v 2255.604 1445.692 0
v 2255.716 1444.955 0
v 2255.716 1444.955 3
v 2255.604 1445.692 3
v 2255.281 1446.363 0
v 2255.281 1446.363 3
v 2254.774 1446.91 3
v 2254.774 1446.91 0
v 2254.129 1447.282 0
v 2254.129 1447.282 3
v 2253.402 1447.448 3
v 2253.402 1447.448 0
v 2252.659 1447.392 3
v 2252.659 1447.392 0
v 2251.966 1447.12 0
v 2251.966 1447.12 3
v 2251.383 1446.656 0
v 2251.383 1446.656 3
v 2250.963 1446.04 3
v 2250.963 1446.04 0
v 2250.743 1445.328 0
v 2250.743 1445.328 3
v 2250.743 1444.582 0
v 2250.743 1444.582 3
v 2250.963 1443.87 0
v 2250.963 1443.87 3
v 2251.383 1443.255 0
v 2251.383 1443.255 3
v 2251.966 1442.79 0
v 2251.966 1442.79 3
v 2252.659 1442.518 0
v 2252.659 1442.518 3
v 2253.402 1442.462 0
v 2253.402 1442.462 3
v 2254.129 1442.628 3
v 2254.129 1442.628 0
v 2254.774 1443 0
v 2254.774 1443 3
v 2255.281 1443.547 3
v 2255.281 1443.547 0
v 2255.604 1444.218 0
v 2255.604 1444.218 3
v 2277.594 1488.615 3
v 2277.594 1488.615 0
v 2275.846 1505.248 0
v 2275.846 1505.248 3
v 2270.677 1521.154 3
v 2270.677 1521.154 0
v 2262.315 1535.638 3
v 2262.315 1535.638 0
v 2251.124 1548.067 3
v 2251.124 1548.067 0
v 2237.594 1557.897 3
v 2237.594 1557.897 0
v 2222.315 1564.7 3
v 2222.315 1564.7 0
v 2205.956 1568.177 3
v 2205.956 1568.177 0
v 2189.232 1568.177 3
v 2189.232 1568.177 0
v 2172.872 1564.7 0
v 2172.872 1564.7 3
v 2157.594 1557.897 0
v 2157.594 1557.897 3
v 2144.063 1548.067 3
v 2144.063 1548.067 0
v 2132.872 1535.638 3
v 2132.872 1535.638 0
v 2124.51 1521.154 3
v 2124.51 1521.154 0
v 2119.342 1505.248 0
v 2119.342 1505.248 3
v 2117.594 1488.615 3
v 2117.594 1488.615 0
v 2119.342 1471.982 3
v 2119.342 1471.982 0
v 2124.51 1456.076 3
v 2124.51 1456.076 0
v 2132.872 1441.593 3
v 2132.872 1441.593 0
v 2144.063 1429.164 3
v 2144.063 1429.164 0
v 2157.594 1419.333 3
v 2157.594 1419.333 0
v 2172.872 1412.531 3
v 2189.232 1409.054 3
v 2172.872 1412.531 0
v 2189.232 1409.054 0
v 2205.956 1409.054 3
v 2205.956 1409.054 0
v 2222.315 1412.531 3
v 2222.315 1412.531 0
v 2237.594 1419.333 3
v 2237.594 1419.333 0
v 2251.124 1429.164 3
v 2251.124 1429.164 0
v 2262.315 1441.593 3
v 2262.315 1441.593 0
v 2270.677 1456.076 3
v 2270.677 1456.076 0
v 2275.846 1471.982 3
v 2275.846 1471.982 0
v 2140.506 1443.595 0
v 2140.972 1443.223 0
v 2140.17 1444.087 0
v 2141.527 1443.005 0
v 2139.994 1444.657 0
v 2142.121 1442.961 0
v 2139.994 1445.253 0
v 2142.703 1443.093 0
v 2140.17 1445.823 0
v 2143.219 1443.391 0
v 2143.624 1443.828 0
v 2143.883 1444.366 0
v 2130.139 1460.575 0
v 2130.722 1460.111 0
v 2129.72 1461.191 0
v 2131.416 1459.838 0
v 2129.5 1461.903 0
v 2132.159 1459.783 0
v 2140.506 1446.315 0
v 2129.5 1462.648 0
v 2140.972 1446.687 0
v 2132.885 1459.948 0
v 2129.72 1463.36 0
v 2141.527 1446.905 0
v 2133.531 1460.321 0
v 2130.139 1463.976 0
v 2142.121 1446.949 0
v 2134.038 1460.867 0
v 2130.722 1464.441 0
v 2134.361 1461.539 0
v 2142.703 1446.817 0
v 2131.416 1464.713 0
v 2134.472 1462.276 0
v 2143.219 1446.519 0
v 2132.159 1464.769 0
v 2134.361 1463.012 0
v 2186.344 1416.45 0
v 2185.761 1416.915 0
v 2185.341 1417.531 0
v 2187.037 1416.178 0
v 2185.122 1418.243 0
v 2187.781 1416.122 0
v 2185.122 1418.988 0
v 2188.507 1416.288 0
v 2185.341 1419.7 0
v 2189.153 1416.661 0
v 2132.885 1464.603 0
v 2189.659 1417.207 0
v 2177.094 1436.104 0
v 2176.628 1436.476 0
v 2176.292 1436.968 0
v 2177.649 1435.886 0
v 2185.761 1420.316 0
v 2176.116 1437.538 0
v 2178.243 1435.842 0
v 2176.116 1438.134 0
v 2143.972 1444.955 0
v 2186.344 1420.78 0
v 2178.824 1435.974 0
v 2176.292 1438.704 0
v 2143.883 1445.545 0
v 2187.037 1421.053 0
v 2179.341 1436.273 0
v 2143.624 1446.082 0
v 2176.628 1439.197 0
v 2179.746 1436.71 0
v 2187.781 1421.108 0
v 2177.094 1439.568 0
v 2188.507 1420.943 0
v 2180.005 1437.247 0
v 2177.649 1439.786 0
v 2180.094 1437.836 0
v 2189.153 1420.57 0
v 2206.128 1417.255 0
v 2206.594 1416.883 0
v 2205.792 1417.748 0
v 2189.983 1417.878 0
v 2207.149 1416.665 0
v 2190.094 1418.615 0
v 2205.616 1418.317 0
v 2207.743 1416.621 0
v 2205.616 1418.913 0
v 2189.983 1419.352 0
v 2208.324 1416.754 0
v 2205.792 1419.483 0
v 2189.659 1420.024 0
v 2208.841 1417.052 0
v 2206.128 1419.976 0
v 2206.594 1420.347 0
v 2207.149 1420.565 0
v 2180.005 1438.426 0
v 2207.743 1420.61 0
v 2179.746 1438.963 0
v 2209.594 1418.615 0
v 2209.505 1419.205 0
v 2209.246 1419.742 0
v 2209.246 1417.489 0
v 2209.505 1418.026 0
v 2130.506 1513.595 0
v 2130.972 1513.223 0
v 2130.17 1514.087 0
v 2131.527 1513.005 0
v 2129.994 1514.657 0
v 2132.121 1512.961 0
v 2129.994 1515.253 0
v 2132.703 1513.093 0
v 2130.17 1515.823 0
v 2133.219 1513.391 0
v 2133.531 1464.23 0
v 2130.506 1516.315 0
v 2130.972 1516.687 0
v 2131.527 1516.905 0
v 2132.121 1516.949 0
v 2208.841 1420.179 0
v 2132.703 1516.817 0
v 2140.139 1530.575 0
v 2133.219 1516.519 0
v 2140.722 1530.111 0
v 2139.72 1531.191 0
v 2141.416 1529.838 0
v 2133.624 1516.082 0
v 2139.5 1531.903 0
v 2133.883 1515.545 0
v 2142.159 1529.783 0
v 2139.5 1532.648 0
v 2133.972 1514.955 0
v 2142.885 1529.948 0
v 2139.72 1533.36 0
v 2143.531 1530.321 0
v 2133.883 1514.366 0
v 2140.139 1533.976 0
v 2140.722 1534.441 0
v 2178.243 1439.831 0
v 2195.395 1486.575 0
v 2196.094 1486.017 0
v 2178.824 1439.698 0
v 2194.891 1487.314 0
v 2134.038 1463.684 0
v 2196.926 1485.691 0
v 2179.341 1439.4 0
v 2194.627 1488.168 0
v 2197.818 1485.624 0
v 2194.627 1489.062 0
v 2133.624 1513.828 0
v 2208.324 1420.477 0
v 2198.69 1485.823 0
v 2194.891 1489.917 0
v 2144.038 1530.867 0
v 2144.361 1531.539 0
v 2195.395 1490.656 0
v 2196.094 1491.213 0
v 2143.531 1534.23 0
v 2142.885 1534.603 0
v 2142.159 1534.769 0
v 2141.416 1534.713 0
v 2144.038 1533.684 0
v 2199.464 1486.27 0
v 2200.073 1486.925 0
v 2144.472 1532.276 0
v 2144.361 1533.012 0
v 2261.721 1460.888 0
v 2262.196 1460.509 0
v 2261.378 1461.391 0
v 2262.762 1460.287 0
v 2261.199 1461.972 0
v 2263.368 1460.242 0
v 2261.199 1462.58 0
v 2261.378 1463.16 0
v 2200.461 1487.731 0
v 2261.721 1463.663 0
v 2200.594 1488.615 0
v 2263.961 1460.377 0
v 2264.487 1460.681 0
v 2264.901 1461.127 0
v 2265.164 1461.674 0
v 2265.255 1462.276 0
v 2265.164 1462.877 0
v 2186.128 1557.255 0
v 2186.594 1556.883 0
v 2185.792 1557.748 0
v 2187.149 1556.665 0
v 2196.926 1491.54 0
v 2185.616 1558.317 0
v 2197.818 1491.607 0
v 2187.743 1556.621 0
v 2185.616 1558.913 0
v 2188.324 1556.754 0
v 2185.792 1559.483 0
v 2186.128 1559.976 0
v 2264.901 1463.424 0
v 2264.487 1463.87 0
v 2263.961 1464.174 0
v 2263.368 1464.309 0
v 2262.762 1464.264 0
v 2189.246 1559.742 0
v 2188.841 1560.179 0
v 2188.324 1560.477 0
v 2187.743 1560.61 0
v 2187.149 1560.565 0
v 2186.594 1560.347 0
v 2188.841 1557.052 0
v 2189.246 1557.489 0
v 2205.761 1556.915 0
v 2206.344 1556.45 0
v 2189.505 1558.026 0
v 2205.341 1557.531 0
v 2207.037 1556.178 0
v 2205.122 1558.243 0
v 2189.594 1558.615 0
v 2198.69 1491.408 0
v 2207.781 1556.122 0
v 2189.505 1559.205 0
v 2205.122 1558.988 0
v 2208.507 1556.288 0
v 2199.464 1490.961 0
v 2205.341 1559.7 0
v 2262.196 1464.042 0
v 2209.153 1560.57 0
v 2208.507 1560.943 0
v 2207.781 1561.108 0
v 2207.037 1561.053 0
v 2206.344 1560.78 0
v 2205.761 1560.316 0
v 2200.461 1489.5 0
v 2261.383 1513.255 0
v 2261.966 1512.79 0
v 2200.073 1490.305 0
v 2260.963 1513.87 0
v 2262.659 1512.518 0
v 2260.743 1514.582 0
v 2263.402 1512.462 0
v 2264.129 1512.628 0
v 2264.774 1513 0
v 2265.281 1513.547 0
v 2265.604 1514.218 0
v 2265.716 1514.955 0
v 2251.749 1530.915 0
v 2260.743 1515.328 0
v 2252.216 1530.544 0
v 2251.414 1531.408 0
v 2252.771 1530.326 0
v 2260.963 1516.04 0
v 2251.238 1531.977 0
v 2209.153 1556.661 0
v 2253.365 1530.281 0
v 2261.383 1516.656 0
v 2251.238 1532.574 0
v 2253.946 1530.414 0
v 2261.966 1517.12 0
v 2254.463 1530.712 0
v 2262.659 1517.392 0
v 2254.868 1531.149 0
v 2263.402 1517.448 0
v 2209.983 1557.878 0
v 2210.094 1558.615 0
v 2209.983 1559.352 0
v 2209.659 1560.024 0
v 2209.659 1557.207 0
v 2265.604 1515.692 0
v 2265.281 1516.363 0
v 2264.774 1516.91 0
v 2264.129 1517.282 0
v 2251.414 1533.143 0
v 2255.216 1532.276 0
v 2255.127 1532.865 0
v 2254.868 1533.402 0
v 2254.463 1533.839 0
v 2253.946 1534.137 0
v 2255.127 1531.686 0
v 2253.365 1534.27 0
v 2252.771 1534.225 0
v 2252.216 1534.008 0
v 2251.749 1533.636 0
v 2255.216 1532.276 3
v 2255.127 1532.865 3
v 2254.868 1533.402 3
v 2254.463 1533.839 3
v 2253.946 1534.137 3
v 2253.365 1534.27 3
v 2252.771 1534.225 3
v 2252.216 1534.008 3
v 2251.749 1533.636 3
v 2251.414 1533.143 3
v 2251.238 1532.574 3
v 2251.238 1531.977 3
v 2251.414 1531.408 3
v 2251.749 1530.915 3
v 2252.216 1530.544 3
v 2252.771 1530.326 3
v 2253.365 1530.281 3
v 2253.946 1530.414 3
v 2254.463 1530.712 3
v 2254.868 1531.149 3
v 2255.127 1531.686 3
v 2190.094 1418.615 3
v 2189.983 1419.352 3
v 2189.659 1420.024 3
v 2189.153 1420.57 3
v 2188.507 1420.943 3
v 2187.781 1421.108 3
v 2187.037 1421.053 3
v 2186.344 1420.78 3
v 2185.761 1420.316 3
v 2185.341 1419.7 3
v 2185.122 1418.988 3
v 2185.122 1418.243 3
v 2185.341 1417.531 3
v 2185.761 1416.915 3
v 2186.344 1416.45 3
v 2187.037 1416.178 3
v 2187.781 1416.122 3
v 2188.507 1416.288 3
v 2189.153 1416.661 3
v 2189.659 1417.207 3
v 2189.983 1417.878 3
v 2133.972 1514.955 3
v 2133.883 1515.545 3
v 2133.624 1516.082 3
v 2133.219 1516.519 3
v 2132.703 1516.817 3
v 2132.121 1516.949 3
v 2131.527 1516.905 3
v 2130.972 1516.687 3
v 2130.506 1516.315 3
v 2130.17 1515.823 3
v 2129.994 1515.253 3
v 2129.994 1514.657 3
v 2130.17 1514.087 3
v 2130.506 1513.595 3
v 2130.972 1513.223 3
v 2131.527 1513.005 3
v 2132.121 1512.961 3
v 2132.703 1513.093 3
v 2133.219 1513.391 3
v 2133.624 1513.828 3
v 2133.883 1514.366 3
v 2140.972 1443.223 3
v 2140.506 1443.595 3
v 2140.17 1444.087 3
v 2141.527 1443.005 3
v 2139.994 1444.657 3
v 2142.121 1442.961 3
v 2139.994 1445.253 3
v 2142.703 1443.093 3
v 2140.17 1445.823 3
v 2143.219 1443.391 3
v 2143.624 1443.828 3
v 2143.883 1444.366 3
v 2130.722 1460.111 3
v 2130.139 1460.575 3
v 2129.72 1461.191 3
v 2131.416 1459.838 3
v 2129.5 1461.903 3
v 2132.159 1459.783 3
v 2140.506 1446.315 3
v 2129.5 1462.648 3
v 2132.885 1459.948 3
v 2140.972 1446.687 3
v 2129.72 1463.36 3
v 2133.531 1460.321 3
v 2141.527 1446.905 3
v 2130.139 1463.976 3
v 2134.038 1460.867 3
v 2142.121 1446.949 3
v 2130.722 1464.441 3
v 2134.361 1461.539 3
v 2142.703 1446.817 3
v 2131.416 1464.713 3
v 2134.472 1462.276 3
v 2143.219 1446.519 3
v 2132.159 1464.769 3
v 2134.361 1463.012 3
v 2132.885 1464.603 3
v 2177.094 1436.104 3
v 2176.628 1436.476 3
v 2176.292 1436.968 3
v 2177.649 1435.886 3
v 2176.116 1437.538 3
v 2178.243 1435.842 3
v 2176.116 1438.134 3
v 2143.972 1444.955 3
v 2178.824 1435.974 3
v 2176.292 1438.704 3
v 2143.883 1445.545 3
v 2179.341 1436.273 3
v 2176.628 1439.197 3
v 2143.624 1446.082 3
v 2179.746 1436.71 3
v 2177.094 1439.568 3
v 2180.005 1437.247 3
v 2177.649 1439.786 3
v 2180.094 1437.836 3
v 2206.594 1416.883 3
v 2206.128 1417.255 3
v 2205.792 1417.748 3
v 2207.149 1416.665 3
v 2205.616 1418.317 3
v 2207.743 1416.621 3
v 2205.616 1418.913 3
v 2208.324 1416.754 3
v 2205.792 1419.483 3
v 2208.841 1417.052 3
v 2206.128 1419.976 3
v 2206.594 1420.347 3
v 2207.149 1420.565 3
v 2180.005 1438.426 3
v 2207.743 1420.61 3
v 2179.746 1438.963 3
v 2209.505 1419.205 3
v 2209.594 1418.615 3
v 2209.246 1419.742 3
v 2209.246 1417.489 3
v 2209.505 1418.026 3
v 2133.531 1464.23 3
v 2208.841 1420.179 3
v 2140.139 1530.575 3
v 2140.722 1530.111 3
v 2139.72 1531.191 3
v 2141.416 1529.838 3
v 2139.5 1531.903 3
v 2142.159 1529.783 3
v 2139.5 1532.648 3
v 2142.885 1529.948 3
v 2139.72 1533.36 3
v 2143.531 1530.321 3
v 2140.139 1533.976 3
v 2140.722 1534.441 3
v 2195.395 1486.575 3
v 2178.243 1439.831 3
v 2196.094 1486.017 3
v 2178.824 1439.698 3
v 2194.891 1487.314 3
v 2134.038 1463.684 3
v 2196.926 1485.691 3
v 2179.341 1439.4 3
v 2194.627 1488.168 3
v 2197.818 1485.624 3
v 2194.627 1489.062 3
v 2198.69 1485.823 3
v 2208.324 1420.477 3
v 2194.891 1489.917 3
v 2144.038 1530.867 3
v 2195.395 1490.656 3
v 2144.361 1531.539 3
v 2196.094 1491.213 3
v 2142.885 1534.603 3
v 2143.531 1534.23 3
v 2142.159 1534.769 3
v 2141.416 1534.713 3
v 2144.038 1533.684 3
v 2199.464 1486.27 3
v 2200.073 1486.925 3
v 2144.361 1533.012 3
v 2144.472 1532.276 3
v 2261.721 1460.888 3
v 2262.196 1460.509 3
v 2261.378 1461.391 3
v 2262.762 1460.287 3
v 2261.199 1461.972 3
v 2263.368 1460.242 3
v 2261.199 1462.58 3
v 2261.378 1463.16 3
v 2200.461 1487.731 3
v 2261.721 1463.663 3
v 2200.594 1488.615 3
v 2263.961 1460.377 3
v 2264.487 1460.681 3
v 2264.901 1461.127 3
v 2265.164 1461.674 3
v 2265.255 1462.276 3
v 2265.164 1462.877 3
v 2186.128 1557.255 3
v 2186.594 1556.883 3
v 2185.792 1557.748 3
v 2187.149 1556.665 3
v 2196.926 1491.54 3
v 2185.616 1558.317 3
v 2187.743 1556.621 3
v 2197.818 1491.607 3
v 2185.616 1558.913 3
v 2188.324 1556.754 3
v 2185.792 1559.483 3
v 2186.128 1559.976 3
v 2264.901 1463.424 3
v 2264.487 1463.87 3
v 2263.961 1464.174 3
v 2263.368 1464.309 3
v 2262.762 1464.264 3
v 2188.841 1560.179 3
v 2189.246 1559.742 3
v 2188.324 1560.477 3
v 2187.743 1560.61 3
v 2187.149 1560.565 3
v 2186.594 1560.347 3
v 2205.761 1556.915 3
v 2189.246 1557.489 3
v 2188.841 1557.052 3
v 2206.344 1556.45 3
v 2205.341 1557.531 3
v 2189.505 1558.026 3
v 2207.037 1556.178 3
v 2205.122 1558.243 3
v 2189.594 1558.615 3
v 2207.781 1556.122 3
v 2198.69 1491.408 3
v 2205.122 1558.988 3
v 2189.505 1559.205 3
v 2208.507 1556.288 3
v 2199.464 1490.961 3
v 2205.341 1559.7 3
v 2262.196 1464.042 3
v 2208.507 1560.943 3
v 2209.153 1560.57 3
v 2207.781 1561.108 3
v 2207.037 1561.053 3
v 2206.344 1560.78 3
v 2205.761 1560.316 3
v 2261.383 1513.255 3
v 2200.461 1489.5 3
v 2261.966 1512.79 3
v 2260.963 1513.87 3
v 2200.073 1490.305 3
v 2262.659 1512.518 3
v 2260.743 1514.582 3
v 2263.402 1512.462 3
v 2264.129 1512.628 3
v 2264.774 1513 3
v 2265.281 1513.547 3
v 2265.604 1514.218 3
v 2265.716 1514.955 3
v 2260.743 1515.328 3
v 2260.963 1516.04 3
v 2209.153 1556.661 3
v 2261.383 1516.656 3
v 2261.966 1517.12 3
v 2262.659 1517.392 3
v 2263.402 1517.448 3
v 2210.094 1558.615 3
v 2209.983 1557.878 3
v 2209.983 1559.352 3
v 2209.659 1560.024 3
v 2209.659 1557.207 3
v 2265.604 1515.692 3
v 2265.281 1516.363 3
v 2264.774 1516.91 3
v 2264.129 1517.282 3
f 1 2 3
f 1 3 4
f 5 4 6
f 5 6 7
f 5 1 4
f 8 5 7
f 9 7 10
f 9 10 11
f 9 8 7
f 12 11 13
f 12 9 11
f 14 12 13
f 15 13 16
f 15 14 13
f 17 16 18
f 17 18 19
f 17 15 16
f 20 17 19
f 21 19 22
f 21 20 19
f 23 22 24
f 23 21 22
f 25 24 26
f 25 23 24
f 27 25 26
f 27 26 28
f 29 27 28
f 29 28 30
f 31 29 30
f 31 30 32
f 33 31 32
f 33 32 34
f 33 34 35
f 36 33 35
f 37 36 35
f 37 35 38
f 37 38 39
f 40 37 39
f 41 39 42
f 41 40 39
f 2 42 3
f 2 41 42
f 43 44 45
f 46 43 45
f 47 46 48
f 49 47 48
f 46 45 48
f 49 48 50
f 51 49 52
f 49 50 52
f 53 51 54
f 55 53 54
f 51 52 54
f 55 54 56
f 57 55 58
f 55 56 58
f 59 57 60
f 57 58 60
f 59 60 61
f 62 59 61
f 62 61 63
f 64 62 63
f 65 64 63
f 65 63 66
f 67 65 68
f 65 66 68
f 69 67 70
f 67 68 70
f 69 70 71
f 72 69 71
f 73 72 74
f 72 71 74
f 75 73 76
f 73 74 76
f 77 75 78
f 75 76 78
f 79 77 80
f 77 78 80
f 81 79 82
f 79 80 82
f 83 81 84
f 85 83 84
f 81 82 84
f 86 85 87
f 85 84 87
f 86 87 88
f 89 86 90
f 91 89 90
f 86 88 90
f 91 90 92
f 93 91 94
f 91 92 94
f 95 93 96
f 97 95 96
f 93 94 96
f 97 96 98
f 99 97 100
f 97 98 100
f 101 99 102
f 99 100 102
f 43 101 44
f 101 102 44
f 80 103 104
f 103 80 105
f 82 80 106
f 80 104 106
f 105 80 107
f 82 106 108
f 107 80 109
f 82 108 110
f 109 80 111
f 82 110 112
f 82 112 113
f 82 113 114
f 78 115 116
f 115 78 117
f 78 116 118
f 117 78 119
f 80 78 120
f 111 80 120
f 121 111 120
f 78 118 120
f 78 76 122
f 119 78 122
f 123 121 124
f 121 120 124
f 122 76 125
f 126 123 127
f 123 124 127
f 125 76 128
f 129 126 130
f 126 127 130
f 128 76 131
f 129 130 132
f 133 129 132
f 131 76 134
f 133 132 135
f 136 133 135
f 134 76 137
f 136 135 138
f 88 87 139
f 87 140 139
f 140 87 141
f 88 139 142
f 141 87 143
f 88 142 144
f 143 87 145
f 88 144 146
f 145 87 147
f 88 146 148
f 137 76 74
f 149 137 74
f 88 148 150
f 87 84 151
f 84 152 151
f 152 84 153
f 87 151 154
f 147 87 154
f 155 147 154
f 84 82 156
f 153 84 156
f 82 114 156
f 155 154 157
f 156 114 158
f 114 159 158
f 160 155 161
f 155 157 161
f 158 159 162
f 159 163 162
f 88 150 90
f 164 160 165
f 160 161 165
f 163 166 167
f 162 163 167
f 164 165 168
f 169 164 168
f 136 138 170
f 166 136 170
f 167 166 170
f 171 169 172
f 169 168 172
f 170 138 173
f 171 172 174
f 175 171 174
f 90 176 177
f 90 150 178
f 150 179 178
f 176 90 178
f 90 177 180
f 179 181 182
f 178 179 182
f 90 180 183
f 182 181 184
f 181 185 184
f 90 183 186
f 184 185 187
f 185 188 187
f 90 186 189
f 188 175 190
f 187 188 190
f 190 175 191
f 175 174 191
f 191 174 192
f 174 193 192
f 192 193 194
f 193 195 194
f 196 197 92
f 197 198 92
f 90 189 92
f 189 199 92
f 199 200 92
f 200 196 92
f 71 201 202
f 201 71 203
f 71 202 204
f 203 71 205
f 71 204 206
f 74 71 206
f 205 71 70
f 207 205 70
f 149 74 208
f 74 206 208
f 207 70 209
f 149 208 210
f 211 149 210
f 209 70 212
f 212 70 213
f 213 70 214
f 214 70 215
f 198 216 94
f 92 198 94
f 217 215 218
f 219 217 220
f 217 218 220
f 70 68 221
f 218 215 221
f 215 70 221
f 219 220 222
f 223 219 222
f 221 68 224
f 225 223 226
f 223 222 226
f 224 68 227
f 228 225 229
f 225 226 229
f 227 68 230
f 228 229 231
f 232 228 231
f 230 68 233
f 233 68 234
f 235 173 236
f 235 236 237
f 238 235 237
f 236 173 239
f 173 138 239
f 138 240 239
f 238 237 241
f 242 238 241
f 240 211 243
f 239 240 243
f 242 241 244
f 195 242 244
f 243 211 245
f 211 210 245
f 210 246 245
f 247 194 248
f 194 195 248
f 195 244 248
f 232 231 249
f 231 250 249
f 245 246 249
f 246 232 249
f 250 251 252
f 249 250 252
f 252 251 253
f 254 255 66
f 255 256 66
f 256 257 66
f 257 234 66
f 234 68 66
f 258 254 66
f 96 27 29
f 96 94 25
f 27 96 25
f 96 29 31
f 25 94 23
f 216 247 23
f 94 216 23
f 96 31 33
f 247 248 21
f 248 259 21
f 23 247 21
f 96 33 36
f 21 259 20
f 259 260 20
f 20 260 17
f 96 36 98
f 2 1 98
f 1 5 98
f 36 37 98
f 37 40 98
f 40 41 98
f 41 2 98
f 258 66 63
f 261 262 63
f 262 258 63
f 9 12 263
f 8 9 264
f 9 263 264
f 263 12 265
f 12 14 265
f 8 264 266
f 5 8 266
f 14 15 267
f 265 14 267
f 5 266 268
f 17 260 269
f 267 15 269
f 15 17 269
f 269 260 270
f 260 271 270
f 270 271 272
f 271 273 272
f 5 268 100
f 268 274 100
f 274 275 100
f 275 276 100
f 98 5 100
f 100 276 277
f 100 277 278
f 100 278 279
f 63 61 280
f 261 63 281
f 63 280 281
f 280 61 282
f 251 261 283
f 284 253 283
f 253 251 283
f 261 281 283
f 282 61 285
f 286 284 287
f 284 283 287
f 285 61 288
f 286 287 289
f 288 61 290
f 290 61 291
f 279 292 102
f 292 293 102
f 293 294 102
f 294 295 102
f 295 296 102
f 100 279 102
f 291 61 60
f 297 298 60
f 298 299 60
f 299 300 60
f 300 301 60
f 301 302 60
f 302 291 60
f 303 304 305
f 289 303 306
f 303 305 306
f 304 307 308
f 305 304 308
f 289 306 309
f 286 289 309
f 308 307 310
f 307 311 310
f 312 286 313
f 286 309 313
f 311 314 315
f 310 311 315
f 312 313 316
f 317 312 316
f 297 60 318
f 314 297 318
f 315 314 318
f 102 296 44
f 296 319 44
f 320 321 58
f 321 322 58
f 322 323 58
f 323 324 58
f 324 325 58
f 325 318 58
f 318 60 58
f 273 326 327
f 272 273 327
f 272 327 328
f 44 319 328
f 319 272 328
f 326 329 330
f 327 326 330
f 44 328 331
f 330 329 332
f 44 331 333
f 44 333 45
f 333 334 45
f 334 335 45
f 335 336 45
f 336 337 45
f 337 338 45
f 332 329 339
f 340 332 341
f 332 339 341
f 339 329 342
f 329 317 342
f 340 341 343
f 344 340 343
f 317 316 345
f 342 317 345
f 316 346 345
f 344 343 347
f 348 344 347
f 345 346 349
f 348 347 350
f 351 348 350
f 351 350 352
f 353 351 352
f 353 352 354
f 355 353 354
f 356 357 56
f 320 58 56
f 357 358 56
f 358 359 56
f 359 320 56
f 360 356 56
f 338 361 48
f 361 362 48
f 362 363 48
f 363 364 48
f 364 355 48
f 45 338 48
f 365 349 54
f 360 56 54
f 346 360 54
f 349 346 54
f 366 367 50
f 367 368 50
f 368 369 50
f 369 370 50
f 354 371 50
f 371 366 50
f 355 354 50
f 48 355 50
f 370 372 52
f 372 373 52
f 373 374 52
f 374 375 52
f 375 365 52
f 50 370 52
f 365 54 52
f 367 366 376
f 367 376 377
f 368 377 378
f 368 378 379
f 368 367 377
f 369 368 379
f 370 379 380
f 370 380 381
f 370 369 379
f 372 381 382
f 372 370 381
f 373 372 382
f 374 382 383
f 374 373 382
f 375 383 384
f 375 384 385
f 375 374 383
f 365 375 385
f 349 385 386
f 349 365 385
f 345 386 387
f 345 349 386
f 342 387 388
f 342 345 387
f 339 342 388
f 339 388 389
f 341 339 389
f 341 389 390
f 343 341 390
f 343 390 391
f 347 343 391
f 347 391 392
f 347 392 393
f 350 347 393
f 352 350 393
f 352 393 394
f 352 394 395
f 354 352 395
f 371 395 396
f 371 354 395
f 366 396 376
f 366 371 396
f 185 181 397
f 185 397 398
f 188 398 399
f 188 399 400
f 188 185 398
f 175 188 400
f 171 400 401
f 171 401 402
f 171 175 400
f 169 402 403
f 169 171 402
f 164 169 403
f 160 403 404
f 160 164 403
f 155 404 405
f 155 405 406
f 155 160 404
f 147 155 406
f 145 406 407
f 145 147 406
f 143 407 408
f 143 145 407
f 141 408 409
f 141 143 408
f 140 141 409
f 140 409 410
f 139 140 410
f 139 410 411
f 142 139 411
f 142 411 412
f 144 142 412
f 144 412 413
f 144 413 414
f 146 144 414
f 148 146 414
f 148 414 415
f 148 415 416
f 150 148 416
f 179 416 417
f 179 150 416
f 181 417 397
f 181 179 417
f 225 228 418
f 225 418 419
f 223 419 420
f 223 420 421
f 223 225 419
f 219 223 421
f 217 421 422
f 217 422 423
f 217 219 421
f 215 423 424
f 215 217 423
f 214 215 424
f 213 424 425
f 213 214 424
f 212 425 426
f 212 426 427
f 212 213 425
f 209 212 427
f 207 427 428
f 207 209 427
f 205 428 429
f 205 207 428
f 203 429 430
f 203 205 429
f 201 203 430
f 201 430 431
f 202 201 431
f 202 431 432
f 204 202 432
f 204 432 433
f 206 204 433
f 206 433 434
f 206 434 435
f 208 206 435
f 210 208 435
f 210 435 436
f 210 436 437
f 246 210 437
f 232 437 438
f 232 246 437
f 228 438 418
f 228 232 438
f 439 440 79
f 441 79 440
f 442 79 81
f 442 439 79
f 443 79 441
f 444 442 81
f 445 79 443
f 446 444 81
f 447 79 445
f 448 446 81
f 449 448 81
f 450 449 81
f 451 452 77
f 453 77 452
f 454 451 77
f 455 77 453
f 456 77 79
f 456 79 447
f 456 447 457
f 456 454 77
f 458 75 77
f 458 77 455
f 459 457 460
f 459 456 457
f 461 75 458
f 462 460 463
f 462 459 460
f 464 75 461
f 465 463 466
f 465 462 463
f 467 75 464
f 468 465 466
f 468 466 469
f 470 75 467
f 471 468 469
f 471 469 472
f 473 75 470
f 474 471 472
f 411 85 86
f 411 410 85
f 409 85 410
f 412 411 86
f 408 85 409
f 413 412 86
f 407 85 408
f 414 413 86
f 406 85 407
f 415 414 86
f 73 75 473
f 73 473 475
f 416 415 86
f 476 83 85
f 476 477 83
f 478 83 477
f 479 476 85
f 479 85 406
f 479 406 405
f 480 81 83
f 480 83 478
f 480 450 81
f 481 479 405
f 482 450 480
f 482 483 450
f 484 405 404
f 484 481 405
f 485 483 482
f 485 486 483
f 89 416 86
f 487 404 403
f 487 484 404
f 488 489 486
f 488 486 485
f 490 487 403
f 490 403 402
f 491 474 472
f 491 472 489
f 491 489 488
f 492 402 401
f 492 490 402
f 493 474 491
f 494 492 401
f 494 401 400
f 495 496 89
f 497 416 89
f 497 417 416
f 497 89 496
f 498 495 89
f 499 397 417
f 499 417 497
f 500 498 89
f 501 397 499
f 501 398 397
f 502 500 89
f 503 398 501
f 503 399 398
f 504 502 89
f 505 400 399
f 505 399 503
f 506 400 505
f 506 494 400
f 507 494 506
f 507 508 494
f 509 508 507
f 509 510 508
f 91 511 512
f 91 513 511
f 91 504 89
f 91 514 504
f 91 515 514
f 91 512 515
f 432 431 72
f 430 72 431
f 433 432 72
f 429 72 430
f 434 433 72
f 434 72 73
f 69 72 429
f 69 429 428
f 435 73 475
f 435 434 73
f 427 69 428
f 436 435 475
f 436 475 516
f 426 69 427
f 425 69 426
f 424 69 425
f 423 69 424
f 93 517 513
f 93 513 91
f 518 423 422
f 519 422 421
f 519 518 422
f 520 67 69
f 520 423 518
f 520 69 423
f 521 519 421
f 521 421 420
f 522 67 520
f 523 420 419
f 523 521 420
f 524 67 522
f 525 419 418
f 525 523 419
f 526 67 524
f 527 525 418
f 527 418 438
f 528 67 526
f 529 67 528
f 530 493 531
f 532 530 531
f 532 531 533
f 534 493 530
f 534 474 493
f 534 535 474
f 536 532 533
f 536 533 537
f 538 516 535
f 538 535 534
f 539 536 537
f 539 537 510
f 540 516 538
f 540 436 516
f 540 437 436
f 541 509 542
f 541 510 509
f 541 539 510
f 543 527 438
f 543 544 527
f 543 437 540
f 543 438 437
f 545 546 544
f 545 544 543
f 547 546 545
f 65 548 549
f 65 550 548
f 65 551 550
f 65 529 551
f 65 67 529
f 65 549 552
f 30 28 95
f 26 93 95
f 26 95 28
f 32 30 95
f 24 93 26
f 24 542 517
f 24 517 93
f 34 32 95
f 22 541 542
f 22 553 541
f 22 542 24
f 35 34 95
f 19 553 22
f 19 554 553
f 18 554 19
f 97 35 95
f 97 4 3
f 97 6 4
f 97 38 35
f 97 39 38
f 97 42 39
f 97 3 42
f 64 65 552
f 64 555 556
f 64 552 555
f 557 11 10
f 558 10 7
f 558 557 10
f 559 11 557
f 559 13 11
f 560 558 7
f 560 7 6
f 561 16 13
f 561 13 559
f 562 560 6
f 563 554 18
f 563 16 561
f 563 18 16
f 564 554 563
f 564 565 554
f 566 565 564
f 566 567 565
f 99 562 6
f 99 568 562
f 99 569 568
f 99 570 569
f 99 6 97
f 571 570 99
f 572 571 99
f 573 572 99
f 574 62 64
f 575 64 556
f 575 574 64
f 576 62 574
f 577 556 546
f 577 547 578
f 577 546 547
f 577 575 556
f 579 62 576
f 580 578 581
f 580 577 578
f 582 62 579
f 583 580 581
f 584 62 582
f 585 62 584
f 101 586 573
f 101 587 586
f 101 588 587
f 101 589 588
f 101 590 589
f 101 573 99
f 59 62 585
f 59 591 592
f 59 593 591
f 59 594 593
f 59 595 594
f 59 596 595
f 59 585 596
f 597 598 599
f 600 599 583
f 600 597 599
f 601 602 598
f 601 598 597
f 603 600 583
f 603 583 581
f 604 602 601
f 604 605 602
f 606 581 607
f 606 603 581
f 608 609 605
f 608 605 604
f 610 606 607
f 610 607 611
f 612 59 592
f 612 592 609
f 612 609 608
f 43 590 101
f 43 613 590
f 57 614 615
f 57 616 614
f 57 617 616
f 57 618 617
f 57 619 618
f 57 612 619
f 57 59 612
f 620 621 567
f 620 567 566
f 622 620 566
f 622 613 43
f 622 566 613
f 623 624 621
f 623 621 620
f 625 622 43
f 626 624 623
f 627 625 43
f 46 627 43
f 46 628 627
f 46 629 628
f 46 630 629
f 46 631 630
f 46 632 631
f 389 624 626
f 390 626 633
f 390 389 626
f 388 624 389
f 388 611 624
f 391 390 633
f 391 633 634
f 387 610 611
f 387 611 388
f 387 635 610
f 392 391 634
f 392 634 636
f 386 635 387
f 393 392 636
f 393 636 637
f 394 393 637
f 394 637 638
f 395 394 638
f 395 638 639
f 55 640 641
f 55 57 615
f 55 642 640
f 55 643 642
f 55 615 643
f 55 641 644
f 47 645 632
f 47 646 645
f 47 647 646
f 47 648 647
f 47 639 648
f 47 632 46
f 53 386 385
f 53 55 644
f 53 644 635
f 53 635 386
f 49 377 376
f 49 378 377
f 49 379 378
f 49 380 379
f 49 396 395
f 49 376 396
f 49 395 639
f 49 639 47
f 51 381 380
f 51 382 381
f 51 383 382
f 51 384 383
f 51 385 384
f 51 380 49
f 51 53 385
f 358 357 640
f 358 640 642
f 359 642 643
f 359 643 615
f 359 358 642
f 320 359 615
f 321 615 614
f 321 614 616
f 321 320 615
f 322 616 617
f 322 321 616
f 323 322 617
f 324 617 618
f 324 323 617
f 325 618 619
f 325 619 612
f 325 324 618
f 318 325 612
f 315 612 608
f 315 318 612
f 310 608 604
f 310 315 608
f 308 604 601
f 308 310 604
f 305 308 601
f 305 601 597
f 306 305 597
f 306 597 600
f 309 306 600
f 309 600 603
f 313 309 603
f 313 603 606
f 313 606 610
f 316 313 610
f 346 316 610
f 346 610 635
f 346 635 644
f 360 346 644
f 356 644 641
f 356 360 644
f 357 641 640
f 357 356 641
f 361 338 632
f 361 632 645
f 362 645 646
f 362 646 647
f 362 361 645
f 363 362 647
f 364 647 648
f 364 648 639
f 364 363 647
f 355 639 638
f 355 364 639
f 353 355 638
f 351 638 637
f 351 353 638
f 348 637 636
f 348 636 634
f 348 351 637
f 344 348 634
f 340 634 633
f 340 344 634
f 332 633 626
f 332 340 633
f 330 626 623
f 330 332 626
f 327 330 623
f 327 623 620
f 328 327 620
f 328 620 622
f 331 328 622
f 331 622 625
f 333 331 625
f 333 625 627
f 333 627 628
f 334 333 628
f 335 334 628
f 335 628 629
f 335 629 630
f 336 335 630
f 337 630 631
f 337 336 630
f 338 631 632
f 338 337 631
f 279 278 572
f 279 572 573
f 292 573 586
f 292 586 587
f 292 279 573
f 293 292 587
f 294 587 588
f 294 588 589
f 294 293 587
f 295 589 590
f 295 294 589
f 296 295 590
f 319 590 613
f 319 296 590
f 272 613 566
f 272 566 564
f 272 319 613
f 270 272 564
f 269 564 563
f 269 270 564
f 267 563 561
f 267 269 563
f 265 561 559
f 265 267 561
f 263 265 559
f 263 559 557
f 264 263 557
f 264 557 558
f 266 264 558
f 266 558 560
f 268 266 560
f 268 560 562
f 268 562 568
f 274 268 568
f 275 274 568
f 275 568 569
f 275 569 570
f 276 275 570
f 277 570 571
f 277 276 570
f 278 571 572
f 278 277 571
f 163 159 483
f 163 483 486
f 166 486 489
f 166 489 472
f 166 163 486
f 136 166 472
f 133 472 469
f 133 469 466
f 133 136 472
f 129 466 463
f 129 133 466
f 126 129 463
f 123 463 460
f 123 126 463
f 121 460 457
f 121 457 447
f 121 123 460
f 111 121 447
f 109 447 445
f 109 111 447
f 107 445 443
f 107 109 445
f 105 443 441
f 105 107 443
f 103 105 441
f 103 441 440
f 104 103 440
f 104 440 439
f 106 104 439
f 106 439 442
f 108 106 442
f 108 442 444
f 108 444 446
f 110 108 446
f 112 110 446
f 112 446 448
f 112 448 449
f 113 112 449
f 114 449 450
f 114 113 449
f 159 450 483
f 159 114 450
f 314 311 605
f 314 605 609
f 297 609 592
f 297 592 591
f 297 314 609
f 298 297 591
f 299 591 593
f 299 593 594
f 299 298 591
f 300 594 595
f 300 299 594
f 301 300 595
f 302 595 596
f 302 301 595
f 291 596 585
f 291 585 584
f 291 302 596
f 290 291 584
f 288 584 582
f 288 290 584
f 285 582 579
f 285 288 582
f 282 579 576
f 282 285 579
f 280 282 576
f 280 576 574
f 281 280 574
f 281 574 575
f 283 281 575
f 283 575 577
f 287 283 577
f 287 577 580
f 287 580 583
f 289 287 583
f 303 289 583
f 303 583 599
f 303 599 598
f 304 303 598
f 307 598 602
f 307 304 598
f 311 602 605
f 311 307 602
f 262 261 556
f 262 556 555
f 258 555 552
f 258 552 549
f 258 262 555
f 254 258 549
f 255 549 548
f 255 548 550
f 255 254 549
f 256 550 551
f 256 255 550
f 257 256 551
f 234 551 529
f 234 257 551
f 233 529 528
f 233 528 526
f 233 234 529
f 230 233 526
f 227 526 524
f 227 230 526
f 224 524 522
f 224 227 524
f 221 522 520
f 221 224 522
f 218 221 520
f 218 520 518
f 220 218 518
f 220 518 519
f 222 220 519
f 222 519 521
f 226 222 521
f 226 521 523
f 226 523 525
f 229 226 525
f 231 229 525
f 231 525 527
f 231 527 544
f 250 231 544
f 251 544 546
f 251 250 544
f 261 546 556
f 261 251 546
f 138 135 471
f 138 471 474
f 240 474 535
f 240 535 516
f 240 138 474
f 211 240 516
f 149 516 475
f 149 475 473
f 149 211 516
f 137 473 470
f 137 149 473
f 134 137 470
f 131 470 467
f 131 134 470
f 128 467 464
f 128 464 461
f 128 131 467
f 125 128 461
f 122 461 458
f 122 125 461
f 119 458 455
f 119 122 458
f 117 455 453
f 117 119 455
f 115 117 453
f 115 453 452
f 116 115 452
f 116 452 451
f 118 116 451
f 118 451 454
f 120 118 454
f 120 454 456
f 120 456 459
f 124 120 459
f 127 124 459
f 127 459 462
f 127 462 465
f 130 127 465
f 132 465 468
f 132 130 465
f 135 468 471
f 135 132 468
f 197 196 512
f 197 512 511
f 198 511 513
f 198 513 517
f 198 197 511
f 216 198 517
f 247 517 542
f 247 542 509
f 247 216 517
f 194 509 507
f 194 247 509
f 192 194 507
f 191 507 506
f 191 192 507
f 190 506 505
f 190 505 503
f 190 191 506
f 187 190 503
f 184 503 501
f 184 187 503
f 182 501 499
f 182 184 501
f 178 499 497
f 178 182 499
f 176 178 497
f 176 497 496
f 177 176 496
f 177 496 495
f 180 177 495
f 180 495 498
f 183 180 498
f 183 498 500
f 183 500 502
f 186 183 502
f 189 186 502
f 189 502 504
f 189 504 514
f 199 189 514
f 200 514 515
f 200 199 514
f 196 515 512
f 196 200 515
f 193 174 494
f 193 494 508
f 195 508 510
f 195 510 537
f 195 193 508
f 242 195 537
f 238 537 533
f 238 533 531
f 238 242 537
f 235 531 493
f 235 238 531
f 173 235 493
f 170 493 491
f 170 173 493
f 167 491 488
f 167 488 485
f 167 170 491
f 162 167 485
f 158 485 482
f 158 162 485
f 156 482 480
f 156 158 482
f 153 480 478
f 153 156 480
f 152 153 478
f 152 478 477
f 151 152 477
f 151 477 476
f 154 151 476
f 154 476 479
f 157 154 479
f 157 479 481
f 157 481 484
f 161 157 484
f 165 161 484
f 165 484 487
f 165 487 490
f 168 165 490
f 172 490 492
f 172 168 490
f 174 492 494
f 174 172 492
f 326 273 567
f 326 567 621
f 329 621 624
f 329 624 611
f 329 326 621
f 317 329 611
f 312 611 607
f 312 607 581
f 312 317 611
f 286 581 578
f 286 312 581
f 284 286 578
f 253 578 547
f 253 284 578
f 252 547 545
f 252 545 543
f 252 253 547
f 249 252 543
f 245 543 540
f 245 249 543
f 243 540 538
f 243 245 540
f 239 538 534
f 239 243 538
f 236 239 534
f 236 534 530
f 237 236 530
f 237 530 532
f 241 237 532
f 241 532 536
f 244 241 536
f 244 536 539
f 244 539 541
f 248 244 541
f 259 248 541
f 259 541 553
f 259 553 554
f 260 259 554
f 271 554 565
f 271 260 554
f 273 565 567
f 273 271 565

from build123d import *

# Parameters (mm, degrees)
SKETCH_1_R      = 80
SKETCH_1_R_2    = 3
SKETCH_1_R_3    = 2
SKETCH_1_R_4    = 2.5
SKETCH_1_R_5    = 2.039490197
EXTRUDE_1_DEPTH = 3


with BuildPart() as part:
    # ｽｹｯﾁ1 → ﾎﾞｽ - 押し出し1 (new body)
    with BuildSketch(Plane.XY):
        with Locations((2197.593788105, 1488.615324608)):
            Circle(SKETCH_1_R)
        with Locations((2197.593788105, 1488.615324608)):
            Circle(SKETCH_1_R_2, mode=Mode.SUBTRACT)
        with Locations((2187.593788105, 1558.615324608)):
            Circle(SKETCH_1_R_3, mode=Mode.SUBTRACT)
        with Locations((2141.97200984, 1532.275578646)):
            Circle(SKETCH_1_R_4, mode=Mode.SUBTRACT)
        with Locations((2207.593788105, 1558.615324608)):
            Circle(SKETCH_1_R_4, mode=Mode.SUBTRACT)
        with Locations((2131.97200984, 1514.95507057)):
            Circle(SKETCH_1_R_3, mode=Mode.SUBTRACT)
        with Locations((2131.97200984, 1462.275578646)):
            Circle(SKETCH_1_R_4, mode=Mode.SUBTRACT)
        with Locations((2141.97200984, 1444.95507057)):
            Circle(SKETCH_1_R_3, mode=Mode.SUBTRACT)
        with Locations((2178.093788105, 1437.836228836)):
            Circle(SKETCH_1_R_3, mode=Mode.SUBTRACT)
        with Locations((2187.593788105, 1418.615324608)):
            Circle(SKETCH_1_R_4, mode=Mode.SUBTRACT)
        with Locations((2207.593788105, 1418.615324608)):
            Circle(SKETCH_1_R_3, mode=Mode.SUBTRACT)
        with Locations((2253.21556637, 1444.95507057)):
            Circle(SKETCH_1_R_4, mode=Mode.SUBTRACT)
        with Locations((2263.21556637, 1462.275578646)):
            Circle(SKETCH_1_R_5, mode=Mode.SUBTRACT)
        with Locations((2263.21556637, 1514.95507057)):
            Circle(SKETCH_1_R_4, mode=Mode.SUBTRACT)
        with Locations((2253.21556637, 1532.275578646)):
            Circle(SKETCH_1_R_3, mode=Mode.SUBTRACT)
    extrude(amount=EXTRUDE_1_DEPTH)


solid = part.part
